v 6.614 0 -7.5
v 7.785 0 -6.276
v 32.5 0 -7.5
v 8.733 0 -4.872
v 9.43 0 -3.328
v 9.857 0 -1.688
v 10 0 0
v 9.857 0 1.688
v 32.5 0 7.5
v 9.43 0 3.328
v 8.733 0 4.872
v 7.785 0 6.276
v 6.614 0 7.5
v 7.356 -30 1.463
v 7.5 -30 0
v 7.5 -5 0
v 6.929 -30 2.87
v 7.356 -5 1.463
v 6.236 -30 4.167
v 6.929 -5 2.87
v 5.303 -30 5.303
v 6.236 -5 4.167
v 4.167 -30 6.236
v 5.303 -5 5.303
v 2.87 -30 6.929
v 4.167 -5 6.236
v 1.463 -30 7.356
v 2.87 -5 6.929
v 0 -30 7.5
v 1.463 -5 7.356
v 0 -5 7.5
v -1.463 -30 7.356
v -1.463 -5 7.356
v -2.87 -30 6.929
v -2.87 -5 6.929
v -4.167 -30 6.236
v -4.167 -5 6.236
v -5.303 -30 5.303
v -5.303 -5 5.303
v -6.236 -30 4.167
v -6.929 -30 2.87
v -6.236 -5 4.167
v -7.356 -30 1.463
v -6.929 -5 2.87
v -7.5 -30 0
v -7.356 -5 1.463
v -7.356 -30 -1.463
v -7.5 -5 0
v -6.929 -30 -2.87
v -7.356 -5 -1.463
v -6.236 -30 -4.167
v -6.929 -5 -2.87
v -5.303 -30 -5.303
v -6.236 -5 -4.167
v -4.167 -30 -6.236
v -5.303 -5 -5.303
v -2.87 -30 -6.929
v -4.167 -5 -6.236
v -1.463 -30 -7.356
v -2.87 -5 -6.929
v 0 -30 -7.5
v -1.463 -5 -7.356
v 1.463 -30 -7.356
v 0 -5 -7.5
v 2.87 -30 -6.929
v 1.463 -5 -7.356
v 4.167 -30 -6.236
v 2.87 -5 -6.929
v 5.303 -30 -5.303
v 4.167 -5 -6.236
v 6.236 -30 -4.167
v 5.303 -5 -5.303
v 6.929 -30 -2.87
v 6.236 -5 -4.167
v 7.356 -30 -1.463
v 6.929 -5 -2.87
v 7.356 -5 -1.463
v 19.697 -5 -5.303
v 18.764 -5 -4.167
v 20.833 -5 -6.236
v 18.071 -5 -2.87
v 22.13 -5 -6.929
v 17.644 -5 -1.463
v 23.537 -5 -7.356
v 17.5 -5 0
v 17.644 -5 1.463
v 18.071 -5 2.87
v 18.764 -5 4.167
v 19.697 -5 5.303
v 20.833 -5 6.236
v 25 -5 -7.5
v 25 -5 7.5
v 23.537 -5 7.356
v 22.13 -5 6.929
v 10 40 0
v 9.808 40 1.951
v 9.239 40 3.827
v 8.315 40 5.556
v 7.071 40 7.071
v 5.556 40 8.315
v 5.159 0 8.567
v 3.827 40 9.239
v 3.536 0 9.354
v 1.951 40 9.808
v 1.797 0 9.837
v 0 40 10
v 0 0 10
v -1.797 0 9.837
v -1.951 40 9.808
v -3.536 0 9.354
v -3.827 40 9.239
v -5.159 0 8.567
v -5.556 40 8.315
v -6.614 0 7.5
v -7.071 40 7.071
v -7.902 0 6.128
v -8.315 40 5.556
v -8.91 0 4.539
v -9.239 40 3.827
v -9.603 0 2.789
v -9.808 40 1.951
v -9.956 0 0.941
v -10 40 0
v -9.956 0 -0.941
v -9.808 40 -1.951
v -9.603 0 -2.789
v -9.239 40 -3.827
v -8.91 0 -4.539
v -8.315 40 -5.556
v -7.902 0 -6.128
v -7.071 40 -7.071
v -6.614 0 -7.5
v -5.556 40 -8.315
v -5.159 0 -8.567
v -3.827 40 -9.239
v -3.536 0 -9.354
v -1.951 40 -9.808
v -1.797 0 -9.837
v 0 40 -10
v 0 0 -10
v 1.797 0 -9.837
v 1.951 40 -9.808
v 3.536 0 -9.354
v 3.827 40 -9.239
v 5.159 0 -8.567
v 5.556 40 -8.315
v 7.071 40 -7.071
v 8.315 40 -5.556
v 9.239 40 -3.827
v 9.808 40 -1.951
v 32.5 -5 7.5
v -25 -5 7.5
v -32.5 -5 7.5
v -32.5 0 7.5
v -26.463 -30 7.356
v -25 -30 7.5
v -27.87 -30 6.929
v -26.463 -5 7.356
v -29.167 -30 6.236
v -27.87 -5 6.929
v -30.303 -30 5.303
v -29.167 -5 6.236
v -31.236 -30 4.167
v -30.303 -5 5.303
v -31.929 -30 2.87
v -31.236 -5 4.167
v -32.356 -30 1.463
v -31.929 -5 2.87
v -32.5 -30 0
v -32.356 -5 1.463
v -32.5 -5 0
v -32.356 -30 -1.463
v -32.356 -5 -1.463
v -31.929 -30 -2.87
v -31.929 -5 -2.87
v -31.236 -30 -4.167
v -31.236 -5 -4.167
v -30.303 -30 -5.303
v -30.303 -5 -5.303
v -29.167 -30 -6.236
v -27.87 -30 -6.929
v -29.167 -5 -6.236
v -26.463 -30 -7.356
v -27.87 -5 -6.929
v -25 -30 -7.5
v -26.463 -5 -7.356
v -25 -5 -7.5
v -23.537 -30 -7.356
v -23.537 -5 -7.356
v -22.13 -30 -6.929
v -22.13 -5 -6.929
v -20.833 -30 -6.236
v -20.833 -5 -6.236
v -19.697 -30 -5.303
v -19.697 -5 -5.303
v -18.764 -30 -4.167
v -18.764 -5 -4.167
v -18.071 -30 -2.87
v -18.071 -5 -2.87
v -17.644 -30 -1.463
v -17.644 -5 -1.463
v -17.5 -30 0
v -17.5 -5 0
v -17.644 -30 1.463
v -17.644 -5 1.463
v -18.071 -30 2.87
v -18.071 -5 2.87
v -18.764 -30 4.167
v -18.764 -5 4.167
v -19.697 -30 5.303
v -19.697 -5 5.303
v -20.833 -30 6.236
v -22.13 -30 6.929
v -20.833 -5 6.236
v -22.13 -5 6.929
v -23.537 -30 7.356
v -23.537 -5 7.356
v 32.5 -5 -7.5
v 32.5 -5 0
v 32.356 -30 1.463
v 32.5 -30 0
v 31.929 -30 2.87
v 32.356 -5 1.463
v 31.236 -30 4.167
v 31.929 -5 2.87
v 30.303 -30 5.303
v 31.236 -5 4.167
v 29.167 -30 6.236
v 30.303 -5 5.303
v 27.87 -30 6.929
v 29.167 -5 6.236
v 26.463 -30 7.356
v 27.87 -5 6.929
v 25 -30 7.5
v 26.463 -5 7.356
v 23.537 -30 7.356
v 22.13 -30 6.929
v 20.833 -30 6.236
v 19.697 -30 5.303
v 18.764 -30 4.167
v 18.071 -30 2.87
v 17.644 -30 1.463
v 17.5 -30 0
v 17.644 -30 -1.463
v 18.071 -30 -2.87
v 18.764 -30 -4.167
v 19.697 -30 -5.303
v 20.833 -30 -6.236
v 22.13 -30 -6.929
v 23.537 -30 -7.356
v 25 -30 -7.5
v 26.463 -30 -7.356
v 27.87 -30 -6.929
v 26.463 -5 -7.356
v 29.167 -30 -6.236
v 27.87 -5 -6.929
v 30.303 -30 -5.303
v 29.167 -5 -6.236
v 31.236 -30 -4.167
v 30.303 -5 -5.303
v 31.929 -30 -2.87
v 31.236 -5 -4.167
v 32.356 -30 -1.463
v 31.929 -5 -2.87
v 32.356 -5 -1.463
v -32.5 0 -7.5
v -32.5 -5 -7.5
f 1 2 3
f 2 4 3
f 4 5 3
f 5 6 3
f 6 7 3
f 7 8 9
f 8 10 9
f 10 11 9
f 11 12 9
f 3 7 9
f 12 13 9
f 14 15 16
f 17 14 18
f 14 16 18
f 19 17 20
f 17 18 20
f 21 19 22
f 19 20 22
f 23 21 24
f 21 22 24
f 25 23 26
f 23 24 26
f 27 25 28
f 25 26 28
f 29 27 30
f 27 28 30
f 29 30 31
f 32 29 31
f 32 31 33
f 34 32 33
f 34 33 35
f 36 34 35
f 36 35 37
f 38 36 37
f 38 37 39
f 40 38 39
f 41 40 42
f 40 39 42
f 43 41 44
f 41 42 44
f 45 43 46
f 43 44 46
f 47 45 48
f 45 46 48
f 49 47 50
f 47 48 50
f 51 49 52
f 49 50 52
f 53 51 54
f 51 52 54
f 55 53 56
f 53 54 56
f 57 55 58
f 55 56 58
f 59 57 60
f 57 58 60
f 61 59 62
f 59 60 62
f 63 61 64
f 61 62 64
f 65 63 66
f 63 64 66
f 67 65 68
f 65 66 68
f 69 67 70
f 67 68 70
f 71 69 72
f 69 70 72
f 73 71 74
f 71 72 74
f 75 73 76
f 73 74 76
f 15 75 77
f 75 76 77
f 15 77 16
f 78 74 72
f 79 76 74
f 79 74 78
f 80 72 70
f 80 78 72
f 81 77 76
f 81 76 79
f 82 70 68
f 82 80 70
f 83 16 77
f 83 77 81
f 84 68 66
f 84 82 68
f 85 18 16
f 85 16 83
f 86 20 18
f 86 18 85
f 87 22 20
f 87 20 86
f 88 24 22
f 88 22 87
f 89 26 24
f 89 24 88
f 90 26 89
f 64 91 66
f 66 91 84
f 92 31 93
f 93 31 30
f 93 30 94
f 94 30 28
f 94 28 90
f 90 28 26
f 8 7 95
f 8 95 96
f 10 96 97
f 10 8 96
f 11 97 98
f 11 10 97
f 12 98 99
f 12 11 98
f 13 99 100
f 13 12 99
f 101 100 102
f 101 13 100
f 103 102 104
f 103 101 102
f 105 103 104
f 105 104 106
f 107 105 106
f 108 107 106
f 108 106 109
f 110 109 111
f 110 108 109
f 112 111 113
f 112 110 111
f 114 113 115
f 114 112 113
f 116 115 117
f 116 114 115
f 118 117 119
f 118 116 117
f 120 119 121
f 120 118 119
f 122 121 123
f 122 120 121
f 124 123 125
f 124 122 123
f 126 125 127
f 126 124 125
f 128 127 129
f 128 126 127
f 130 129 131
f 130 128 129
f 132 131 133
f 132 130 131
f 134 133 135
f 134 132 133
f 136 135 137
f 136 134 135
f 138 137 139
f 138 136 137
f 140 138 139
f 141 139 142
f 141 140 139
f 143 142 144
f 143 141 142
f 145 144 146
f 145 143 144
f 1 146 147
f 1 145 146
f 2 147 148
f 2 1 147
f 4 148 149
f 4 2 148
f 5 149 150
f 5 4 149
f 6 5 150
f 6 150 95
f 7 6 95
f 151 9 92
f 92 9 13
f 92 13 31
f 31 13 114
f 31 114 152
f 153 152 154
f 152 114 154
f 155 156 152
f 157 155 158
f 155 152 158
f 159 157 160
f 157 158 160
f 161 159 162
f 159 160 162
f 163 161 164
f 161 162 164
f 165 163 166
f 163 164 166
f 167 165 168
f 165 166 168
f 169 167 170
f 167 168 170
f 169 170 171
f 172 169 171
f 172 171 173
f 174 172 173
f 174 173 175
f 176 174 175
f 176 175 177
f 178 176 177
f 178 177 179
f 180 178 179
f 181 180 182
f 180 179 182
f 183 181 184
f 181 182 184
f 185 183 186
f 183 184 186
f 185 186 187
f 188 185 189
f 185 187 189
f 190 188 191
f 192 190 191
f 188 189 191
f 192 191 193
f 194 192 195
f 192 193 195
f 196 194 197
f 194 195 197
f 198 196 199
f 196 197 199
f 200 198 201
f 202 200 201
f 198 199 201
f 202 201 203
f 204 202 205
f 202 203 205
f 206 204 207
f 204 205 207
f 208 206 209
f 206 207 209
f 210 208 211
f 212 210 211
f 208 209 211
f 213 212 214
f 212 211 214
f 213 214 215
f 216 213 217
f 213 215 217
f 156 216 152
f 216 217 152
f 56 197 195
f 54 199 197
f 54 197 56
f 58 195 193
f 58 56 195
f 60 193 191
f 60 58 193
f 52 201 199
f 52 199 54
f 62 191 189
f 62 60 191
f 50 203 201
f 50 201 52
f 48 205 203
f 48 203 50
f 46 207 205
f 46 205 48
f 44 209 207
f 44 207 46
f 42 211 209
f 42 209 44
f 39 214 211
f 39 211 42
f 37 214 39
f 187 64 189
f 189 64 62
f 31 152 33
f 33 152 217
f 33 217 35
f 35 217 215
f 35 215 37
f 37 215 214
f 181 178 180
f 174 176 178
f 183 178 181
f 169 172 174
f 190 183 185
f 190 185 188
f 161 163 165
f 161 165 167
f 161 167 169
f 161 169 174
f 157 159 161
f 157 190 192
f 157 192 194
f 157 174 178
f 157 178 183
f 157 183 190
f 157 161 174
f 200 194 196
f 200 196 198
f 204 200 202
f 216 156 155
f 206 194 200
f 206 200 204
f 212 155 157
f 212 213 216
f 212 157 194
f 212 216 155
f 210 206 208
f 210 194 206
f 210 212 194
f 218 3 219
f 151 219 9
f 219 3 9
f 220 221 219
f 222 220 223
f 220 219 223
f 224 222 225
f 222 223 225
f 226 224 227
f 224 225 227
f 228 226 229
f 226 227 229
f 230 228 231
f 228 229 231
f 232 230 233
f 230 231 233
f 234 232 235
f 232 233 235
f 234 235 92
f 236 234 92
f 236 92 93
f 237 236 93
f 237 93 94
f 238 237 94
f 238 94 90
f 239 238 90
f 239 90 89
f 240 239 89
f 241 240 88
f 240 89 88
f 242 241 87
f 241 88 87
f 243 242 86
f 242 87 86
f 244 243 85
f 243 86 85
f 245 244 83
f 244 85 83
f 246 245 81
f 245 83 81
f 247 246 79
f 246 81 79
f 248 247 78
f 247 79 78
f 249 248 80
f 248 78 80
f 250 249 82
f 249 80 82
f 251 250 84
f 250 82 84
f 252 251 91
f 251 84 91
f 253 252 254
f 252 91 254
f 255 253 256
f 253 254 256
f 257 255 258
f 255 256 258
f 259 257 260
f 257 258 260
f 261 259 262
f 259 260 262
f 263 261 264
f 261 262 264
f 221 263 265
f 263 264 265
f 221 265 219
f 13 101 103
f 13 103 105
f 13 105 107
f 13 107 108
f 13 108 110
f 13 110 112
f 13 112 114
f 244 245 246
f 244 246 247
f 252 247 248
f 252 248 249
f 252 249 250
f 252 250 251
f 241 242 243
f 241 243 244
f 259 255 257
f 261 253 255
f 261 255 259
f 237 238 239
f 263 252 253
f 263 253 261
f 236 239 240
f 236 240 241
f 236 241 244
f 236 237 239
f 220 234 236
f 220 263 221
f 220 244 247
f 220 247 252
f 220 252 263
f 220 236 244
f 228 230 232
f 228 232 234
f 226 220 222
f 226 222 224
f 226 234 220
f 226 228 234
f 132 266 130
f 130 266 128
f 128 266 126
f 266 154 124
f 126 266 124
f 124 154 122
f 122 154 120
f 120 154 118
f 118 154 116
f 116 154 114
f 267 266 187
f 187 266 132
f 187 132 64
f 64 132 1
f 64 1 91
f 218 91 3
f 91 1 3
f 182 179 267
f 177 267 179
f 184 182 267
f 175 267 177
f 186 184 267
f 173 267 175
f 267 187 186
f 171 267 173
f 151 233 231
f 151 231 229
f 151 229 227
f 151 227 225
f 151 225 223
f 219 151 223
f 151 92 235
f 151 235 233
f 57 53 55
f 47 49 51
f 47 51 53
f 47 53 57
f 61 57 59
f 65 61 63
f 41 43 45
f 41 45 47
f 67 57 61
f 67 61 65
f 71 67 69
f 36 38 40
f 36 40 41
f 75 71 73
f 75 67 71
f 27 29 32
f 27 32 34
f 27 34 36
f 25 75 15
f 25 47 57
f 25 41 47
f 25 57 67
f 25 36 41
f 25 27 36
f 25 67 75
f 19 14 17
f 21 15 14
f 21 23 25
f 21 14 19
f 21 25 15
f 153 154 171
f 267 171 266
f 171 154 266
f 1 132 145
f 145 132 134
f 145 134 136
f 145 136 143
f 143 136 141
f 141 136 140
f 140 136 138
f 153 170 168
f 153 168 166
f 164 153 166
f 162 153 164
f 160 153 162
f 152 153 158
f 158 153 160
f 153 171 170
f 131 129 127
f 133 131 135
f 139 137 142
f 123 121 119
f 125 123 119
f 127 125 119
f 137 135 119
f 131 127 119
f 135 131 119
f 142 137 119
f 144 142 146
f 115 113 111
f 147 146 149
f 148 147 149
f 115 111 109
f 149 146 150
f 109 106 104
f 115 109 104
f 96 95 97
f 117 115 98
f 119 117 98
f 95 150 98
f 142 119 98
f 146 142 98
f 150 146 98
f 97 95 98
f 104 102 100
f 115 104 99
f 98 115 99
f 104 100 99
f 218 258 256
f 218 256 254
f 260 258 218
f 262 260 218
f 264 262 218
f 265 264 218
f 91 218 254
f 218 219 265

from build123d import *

# Parameters (mm, degrees)
F1_DEPTH = 5
F2_DEPTH = 30
F3_R     = 10
F4_DEPTH = 40


with BuildPart() as f1:
    # F0 (on Front) → F1 (new body)
    with BuildSketch(Plane.XZ):
        with BuildLine():
            Line((25, -7.5), (32.5, -7.5))
            Line((32.5, -7.5), (32.5, 0))
            ThreePointArc((32.5, 0), (30.3033008589, -5.3033008589), (25, -7.5))
        make_face()
        with BuildLine():
            Line((-32.5, -7.5), (-25, -7.5))
            ThreePointArc((-25, -7.5), (-30.3033008589, -5.3033008589), (-32.5, 0))
            Line((-32.5, 0), (-32.5, -7.5))
        make_face()
        with BuildLine():
            ThreePointArc((25, 7.5), (30.3033008589, 5.3033008589), (32.5, 0))
            Line((32.5, 0), (32.5, 7.5))
            Line((32.5, 7.5), (25, 7.5))
        make_face()
        with BuildLine():
            Line((-32.5, 7.5), (-32.5, 0))
            ThreePointArc((-32.5, 0), (-30.3033008589, 5.3033008589), (-25, 7.5))
            Line((-25, 7.5), (-32.5, 7.5))
        make_face()
        with BuildLine():
            Line((-25, -7.5), (-2.86e-08, -7.5))
            ThreePointArc((-2.86e-08, -7.5), (-7.5, 1.43e-08), (0, 7.5))
            Line((0, 7.5), (-25, 7.5))
            ThreePointArc((-25, 7.5), (-19.6966991411, 5.3033008589), (-17.5, 0))
            ThreePointArc((-17.5, 0), (-19.6966991411, -5.3033008589), (-25, -7.5))
        make_face()
        with BuildLine():
            ThreePointArc((-32.5, 0), (-30.3033008589, -5.3033008589), (-25, -7.5))
            ThreePointArc((-25, -7.5), (-19.6966991411, -5.3033008589), (-17.5, 0))
            ThreePointArc((-17.5, 0), (-19.6966991411, 5.3033008589), (-25, 7.5))
            ThreePointArc((-25, 7.5), (-30.3033008589, 5.3033008589), (-32.5, 0))
        make_face()
        with BuildLine():
            ThreePointArc((0, 7.5), (-7.5, 1.43e-08), (-2.86e-08, -7.5))
            ThreePointArc((-2.86e-08, -7.5), (5.3033008488, -5.303300869), (7.5, 0))
            ThreePointArc((7.5, 0), (5.3033008589, 5.3033008589), (0, 7.5))
        make_face()
        with BuildLine():
            Line((-2.86e-08, -7.5), (25, -7.5))
            ThreePointArc((25, -7.5), (17.5, 0), (25, 7.5))
            Line((25, 7.5), (0, 7.5))
            ThreePointArc((0, 7.5), (5.3033008589, 5.3033008589), (7.5, 0))
            ThreePointArc((7.5, 0), (5.3033008488, -5.303300869), (-2.86e-08, -7.5))
        make_face()
        with BuildLine():
            ThreePointArc((25, 7.5), (17.5, 0), (25, -7.5))
            ThreePointArc((25, -7.5), (30.3033008589, -5.3033008589), (32.5, 0))
            ThreePointArc((32.5, 0), (30.3033008589, 5.3033008589), (25, 7.5))
        make_face()
    extrude(amount=F1_DEPTH)

    # F0 (on Front) → F2 (join)
    with BuildSketch(Plane.XZ):
        with BuildLine():
            ThreePointArc((-32.5, 0), (-30.3033008589, -5.3033008589), (-25, -7.5))
            ThreePointArc((-25, -7.5), (-19.6966991411, -5.3033008589), (-17.5, 0))
            ThreePointArc((-17.5, 0), (-19.6966991411, 5.3033008589), (-25, 7.5))
            ThreePointArc((-25, 7.5), (-30.3033008589, 5.3033008589), (-32.5, 0))
        make_face()
        with BuildLine():
            ThreePointArc((25, 7.5), (17.5, 0), (25, -7.5))
            ThreePointArc((25, -7.5), (30.3033008589, -5.3033008589), (32.5, 0))
            ThreePointArc((32.5, 0), (30.3033008589, 5.3033008589), (25, 7.5))
        make_face()
        with BuildLine():
            ThreePointArc((0, 7.5), (-7.5, 1.43e-08), (-2.86e-08, -7.5))
            ThreePointArc((-2.86e-08, -7.5), (5.3033008488, -5.303300869), (7.5, 0))
            ThreePointArc((7.5, 0), (5.3033008589, 5.3033008589), (0, 7.5))
        make_face()
    extrude(amount=F2_DEPTH)

    # F3 (on Front) → F4 (join)
    with BuildSketch(Plane.XZ):
        Circle(F3_R)
    extrude(amount=-F4_DEPTH)


solid = f1.part
